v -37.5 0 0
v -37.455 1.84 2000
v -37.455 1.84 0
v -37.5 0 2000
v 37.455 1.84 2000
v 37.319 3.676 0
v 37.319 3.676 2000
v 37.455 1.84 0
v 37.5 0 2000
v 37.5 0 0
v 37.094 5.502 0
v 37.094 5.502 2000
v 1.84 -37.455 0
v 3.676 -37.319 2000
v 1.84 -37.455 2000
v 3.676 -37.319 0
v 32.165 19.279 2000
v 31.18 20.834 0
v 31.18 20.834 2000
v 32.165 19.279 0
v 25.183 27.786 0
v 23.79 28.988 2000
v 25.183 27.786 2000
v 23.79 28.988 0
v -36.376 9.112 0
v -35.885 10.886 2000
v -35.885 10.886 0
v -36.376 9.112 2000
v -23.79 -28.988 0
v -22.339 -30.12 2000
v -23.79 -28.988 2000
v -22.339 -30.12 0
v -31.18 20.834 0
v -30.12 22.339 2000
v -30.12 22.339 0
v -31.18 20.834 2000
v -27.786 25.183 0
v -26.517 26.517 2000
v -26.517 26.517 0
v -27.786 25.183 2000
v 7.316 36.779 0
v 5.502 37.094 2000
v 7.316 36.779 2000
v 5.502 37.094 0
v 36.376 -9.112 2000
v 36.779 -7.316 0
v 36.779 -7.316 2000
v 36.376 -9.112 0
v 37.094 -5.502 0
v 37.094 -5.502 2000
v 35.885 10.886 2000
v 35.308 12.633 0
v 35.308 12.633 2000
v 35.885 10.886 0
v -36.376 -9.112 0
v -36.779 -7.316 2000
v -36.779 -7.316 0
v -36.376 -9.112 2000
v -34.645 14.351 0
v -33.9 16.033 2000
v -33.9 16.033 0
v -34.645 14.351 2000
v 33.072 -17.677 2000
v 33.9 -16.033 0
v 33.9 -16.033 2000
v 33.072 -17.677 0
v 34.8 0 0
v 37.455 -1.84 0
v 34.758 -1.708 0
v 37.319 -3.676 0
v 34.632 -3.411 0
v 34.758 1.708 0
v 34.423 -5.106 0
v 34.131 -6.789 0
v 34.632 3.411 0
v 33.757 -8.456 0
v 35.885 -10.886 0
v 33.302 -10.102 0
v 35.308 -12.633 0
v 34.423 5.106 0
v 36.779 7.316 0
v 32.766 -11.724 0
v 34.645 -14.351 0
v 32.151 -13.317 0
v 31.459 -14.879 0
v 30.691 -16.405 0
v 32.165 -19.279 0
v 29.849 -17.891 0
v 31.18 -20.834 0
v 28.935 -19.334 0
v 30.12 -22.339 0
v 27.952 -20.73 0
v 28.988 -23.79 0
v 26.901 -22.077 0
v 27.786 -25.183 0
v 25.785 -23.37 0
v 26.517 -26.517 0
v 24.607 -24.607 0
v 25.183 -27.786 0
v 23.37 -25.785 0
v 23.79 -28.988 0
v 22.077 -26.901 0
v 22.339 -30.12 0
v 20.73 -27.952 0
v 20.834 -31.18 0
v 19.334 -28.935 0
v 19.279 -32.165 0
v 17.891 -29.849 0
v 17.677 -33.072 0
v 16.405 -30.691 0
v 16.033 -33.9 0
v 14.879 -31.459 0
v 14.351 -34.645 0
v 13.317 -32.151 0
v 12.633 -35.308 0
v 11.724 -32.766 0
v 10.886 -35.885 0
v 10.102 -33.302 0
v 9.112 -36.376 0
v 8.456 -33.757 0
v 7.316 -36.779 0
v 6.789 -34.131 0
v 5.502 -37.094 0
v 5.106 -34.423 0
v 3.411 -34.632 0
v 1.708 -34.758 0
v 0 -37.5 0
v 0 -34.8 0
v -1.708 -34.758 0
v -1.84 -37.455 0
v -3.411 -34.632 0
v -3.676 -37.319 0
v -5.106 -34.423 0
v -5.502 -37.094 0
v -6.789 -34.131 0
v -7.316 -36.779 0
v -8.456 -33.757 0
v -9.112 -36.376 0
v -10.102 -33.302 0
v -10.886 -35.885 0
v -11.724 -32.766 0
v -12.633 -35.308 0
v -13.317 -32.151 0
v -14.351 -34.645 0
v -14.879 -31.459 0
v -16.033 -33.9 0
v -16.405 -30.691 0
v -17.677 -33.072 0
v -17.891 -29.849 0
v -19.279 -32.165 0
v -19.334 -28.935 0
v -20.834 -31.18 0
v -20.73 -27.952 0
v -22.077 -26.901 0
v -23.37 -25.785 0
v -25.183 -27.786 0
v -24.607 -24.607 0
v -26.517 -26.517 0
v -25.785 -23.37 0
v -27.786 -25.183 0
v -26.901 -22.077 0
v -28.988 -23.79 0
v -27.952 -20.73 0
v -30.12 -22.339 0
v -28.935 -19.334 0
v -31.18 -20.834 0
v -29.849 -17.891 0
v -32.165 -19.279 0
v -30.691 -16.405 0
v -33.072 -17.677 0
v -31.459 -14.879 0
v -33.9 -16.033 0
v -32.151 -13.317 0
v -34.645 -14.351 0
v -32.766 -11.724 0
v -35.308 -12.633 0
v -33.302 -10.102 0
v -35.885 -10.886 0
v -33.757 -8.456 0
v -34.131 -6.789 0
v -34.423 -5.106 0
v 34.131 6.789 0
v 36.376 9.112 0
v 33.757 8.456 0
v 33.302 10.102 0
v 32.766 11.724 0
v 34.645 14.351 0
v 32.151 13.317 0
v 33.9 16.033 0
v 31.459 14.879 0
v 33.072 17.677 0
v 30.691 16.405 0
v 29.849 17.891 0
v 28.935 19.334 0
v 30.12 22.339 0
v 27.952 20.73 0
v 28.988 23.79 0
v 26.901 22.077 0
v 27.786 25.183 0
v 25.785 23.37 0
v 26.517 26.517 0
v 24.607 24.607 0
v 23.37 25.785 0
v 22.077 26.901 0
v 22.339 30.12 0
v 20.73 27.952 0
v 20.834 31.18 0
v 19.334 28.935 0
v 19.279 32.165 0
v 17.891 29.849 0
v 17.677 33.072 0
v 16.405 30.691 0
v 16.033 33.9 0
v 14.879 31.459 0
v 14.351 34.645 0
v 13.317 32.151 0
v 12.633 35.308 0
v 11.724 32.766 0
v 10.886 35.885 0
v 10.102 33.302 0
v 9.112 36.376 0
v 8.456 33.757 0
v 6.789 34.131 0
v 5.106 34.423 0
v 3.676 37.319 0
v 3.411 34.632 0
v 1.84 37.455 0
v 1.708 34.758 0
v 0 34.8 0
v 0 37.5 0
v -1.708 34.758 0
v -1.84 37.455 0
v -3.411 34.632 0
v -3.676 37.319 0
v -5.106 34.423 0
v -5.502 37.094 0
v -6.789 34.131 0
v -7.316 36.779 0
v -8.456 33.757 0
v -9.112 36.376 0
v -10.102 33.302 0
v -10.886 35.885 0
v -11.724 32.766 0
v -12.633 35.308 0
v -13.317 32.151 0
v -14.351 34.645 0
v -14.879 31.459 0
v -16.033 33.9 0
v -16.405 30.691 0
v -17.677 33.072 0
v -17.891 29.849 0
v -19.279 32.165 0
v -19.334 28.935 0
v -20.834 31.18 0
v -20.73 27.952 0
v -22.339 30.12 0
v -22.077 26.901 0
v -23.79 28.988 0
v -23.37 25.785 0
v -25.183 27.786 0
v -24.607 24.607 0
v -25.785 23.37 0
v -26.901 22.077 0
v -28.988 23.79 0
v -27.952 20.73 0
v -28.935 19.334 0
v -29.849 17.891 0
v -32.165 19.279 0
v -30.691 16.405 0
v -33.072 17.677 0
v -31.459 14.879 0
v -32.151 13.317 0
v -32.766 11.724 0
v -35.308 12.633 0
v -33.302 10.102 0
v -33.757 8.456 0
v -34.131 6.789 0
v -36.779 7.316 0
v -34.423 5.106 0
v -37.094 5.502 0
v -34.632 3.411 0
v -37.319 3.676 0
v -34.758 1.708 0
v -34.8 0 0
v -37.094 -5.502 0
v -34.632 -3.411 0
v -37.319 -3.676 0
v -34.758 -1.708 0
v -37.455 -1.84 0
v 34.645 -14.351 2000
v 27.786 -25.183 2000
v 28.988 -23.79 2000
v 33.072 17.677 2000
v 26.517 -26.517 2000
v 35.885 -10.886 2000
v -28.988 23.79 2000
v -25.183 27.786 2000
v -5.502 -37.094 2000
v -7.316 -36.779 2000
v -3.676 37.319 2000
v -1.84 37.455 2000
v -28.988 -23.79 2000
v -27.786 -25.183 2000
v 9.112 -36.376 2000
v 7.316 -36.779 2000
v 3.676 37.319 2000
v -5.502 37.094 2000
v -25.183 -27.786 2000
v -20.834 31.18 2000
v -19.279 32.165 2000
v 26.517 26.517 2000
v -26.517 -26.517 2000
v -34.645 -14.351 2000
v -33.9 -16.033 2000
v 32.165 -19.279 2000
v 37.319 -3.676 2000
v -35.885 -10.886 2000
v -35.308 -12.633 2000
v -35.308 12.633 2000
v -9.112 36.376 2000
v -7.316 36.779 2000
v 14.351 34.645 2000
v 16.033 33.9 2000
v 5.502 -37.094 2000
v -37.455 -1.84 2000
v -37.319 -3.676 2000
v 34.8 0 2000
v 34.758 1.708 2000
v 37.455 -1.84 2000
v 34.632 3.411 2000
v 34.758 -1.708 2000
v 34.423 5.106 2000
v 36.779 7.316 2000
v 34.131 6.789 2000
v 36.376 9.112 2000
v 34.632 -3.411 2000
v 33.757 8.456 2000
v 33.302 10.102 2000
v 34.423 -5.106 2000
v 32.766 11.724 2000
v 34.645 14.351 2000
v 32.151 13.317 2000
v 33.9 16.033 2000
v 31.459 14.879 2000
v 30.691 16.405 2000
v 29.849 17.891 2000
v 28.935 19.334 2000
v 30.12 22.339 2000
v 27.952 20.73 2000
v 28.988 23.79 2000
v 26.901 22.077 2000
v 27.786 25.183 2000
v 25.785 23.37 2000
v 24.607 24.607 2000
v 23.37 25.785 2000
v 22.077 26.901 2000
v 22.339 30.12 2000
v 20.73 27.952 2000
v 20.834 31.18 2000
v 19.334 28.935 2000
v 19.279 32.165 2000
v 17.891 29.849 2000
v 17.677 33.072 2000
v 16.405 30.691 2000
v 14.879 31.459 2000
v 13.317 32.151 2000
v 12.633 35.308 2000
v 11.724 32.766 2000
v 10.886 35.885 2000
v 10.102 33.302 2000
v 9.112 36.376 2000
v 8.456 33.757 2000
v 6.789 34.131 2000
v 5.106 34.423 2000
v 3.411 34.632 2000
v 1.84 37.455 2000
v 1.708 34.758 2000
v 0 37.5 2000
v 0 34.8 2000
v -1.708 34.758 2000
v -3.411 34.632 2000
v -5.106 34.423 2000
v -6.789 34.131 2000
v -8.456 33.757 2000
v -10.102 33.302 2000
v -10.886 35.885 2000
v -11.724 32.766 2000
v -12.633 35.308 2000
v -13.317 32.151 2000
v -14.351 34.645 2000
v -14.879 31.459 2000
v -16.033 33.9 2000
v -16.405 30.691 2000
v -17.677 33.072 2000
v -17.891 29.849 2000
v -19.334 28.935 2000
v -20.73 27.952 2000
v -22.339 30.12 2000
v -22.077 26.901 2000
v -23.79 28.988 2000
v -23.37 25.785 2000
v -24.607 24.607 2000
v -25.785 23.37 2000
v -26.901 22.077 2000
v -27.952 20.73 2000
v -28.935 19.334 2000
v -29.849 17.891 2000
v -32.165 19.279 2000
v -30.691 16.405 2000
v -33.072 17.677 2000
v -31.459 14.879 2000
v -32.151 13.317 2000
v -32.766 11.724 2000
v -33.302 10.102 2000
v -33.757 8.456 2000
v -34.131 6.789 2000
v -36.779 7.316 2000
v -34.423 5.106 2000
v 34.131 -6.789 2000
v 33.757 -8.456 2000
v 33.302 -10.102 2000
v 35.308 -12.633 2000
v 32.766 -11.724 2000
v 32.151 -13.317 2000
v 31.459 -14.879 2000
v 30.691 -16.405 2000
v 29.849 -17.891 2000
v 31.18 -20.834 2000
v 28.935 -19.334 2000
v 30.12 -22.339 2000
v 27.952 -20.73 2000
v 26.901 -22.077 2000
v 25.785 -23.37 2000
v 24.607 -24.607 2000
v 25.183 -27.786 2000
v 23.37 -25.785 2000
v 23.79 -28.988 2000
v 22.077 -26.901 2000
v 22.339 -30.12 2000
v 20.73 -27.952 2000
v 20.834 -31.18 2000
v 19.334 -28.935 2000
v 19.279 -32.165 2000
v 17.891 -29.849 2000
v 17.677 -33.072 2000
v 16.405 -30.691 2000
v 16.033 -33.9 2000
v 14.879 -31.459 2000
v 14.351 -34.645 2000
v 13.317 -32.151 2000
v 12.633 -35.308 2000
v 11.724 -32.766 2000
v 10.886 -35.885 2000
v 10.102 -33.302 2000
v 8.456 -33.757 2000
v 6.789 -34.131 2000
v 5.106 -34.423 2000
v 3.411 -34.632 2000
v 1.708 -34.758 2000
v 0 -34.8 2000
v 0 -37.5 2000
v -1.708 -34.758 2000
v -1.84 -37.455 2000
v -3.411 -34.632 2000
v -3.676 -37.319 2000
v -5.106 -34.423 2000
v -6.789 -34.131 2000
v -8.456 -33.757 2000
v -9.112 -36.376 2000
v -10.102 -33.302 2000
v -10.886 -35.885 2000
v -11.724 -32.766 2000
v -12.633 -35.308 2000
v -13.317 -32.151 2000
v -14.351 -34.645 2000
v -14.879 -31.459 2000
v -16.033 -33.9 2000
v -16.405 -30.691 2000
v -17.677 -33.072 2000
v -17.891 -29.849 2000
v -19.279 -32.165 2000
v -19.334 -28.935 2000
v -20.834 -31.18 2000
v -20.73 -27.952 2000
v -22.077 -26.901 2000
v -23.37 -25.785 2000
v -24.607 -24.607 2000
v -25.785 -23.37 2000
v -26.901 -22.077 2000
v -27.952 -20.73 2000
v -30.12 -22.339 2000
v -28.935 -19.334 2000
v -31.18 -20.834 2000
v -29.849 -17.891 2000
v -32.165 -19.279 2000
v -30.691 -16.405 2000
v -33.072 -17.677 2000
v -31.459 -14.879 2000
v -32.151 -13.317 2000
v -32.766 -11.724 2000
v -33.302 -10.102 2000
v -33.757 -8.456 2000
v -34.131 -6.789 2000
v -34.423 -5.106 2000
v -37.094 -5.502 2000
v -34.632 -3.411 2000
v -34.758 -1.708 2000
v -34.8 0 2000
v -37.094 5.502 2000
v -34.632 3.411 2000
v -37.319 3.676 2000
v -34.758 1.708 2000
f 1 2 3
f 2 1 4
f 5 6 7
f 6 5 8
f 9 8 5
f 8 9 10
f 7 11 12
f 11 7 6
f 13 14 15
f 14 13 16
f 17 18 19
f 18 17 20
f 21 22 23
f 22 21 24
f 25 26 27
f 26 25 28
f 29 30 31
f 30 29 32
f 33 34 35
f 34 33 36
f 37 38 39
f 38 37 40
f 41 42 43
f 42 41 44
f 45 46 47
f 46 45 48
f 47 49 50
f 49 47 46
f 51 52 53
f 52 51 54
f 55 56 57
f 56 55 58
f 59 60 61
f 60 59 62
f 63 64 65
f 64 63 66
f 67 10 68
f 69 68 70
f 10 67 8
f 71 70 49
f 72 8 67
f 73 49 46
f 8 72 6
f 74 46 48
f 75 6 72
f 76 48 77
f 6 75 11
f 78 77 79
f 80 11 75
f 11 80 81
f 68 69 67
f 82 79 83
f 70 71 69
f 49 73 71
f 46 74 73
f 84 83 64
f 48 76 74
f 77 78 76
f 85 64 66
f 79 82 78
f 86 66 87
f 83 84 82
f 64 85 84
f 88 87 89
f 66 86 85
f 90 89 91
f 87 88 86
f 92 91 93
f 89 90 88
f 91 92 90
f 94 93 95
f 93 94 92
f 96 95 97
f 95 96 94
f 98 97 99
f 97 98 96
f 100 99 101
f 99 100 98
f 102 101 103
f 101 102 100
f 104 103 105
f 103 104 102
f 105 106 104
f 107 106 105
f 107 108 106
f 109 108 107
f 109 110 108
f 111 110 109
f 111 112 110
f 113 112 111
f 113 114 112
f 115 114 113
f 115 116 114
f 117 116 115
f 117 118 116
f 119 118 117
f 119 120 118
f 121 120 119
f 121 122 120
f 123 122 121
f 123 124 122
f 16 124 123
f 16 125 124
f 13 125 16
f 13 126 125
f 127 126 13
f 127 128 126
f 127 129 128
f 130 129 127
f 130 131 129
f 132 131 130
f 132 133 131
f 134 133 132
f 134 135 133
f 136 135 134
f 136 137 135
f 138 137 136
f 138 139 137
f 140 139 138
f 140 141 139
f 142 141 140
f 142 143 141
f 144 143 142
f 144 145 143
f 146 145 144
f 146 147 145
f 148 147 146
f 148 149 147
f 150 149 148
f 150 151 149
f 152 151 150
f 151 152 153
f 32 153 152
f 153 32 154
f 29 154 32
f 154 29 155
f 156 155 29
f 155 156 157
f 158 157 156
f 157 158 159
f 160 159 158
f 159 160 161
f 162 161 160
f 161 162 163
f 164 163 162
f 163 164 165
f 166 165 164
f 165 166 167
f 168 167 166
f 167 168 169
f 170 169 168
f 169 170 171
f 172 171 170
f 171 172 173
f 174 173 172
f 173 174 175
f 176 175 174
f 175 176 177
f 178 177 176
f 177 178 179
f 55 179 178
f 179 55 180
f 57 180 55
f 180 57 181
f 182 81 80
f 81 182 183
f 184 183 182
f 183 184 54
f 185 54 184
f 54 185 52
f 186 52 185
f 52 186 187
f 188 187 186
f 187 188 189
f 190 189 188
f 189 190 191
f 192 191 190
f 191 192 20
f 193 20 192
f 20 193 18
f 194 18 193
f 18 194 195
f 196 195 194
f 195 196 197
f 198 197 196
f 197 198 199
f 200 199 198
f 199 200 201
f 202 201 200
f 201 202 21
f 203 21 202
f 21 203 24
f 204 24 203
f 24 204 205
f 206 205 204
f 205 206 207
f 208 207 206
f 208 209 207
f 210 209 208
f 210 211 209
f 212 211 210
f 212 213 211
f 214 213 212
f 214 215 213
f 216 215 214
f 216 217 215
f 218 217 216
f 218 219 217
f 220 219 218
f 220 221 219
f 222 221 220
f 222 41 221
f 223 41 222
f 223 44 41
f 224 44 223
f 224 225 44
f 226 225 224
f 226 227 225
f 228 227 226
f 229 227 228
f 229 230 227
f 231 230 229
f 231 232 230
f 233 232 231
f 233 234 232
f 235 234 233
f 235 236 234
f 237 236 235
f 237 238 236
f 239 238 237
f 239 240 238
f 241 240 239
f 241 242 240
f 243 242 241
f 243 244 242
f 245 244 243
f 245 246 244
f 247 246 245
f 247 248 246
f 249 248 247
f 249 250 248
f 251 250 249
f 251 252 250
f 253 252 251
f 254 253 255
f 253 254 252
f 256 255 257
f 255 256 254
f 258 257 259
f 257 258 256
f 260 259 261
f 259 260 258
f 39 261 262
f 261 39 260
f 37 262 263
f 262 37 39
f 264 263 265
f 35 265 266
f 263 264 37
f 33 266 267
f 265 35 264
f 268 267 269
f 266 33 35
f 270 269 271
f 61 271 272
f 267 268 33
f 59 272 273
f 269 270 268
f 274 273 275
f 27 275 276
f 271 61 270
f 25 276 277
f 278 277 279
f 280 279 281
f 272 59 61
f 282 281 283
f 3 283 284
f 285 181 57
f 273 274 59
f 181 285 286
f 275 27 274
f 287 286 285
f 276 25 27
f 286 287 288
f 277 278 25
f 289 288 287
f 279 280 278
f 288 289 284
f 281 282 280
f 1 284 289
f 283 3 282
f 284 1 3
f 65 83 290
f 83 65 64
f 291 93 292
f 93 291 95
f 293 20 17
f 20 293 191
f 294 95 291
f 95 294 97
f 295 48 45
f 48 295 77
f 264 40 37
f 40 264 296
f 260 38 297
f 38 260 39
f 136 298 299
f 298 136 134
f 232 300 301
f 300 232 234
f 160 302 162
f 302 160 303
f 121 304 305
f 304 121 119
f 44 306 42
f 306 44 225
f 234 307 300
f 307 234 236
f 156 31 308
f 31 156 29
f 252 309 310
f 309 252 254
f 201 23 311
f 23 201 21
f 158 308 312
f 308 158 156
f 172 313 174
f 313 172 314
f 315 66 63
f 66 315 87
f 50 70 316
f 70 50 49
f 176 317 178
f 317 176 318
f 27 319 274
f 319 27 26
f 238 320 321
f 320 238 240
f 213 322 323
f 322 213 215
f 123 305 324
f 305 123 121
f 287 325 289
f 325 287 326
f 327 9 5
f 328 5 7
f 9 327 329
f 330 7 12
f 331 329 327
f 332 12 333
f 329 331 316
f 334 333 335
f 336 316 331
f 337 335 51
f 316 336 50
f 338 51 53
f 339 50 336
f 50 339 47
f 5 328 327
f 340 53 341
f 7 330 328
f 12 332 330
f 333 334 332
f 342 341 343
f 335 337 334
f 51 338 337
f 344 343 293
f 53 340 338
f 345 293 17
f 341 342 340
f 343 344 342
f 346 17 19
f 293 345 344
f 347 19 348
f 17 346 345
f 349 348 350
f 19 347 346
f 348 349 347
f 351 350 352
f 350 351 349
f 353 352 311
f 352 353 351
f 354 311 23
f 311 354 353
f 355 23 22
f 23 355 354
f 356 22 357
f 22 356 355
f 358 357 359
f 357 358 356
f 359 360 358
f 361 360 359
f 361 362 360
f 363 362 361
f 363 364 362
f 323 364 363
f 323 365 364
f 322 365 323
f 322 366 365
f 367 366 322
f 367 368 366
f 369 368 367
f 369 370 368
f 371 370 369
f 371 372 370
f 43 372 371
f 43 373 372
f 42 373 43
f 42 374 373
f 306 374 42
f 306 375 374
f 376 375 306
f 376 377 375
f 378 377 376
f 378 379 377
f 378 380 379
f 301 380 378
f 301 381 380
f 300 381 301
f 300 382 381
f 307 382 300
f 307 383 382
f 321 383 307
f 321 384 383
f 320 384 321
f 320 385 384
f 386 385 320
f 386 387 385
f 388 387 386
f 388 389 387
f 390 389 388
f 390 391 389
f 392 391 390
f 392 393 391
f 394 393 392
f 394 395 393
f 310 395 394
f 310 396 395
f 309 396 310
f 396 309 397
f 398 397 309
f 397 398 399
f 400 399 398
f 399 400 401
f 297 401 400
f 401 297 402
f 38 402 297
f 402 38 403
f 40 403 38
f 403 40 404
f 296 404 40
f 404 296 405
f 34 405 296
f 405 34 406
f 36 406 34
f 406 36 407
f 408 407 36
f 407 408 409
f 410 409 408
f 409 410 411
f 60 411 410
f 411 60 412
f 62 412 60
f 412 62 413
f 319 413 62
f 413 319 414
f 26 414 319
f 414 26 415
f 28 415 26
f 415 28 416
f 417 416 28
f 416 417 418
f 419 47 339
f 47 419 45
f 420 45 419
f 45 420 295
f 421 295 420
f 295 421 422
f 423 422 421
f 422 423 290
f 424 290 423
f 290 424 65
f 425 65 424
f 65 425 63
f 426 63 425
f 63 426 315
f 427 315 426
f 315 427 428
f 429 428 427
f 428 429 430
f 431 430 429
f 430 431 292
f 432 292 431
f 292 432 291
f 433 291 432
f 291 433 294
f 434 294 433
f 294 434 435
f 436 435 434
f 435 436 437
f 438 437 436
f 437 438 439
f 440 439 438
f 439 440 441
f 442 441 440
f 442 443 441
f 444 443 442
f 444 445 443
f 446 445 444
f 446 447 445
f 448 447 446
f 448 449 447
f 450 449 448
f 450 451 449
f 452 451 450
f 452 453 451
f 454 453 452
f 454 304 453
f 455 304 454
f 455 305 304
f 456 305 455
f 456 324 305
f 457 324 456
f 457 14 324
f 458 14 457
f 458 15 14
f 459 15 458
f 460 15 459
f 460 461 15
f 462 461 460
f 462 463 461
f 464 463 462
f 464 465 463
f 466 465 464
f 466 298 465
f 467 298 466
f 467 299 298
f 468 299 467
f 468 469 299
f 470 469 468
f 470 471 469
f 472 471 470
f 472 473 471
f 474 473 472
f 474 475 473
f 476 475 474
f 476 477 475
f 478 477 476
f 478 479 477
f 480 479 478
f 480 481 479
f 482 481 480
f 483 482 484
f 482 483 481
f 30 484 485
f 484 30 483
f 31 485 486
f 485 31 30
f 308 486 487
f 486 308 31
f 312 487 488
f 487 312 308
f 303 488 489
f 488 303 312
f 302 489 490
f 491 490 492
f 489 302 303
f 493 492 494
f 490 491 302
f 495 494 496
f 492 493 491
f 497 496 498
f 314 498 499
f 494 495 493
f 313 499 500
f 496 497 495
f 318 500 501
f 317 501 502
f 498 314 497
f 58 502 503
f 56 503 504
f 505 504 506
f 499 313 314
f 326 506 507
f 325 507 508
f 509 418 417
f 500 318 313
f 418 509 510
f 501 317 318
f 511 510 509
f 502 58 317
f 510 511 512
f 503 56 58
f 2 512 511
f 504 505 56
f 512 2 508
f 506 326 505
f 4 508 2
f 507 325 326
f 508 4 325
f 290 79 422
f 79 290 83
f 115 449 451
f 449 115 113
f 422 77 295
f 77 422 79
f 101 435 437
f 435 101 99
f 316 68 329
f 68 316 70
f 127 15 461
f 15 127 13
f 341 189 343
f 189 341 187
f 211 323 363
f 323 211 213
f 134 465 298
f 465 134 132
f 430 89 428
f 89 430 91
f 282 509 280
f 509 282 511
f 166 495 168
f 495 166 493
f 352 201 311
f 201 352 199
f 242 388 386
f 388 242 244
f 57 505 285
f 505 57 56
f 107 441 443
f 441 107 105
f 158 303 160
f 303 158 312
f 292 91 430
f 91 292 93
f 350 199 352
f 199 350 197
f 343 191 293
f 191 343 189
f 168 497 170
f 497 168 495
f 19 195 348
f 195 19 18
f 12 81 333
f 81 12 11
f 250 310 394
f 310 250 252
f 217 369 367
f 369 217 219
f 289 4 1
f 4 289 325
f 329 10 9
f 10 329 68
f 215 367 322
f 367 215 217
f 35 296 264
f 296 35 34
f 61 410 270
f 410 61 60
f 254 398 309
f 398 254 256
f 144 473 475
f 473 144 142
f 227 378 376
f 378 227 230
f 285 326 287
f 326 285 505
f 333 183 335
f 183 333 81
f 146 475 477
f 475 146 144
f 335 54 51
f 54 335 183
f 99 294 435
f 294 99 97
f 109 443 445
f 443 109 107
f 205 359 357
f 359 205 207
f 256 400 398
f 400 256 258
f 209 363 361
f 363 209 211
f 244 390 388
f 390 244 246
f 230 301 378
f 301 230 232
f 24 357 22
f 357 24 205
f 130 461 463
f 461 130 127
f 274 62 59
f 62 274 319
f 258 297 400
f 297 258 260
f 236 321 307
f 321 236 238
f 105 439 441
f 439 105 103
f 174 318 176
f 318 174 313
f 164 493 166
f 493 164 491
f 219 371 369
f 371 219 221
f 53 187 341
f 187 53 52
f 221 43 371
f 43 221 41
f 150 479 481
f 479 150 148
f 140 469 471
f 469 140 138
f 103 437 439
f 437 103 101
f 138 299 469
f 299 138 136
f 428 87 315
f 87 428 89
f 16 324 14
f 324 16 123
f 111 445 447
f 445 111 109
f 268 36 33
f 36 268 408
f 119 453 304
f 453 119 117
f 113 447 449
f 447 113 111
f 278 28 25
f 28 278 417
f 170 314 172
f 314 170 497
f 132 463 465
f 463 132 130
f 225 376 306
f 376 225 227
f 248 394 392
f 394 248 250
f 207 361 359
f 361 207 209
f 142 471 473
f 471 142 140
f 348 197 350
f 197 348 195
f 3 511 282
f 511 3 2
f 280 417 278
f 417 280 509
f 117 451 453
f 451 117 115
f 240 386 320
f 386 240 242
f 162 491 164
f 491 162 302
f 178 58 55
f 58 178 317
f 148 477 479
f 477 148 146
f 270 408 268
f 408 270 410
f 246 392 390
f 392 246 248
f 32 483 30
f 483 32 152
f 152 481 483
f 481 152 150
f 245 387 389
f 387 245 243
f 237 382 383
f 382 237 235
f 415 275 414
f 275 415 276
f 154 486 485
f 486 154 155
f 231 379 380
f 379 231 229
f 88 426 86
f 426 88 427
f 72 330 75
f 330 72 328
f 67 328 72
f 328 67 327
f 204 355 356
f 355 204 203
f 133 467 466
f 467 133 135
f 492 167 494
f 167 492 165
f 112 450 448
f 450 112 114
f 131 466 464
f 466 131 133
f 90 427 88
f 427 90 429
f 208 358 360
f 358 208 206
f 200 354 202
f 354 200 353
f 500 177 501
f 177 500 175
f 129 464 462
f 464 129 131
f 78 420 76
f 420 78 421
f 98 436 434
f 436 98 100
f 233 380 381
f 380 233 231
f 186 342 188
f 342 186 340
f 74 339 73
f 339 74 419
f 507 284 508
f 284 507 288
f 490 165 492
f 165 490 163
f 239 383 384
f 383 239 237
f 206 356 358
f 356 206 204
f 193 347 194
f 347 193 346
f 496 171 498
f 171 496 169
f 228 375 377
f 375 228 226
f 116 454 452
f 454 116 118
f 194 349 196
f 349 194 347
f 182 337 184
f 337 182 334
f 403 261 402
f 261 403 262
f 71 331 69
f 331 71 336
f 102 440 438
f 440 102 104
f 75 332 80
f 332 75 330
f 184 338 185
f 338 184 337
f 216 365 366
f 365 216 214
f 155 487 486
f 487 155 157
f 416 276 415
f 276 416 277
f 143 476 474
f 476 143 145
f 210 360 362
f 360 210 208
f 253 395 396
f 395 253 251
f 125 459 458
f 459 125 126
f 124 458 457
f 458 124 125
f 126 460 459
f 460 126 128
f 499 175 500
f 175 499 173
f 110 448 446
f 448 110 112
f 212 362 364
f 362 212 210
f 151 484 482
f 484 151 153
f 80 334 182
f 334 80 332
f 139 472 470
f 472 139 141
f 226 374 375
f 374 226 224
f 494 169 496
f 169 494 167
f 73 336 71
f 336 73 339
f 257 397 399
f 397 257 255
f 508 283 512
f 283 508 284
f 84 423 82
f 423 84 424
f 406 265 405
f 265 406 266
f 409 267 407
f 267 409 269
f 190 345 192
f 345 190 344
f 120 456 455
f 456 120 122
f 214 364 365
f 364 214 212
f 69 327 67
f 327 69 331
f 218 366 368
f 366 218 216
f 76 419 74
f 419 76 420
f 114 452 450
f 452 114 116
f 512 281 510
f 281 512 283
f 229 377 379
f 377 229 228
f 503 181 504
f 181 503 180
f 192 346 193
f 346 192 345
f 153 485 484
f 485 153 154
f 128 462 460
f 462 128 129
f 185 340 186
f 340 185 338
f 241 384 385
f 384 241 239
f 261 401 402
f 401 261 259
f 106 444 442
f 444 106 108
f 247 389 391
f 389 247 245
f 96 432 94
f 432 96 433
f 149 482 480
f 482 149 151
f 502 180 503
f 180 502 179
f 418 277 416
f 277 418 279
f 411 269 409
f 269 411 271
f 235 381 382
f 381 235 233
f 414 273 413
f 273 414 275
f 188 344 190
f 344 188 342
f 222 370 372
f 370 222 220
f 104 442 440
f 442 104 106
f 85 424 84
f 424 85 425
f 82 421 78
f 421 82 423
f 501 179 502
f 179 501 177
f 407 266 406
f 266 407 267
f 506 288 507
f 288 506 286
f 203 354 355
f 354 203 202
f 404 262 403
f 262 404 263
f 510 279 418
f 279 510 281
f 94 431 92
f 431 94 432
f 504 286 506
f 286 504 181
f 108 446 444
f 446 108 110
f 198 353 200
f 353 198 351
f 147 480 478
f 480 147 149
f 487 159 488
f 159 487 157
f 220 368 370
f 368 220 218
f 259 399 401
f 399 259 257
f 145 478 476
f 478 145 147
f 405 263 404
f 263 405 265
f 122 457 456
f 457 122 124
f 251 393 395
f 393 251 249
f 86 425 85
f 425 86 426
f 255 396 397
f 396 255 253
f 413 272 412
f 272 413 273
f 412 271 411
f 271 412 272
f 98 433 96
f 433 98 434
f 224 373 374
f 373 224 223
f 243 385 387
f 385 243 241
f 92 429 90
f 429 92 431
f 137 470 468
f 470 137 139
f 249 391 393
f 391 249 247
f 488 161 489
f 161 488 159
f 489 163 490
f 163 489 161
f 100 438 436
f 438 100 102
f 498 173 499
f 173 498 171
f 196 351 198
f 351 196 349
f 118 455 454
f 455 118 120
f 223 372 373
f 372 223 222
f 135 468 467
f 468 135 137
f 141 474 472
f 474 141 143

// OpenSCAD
$fn = 128;

// HT pipe parameters (approximate for HT 75)
// Nominal DN 75: outer diameter ~75 mm, typical wall thickness ~2.7 mm
pipe_length = 2000;      // mm
outer_d = 75;            // mm
wall = 2.7;              // mm
inner_d = outer_d - 2*wall;

module ht_pipe(od, id, L) {
    difference() {
        cylinder(h = L, d = od, center = false);
        translate([0,0,-0.1])
            cylinder(h = L + 0.2, d = id, center = false);
    }
}

ht_pipe(outer_d, inner_d, pipe_length);
